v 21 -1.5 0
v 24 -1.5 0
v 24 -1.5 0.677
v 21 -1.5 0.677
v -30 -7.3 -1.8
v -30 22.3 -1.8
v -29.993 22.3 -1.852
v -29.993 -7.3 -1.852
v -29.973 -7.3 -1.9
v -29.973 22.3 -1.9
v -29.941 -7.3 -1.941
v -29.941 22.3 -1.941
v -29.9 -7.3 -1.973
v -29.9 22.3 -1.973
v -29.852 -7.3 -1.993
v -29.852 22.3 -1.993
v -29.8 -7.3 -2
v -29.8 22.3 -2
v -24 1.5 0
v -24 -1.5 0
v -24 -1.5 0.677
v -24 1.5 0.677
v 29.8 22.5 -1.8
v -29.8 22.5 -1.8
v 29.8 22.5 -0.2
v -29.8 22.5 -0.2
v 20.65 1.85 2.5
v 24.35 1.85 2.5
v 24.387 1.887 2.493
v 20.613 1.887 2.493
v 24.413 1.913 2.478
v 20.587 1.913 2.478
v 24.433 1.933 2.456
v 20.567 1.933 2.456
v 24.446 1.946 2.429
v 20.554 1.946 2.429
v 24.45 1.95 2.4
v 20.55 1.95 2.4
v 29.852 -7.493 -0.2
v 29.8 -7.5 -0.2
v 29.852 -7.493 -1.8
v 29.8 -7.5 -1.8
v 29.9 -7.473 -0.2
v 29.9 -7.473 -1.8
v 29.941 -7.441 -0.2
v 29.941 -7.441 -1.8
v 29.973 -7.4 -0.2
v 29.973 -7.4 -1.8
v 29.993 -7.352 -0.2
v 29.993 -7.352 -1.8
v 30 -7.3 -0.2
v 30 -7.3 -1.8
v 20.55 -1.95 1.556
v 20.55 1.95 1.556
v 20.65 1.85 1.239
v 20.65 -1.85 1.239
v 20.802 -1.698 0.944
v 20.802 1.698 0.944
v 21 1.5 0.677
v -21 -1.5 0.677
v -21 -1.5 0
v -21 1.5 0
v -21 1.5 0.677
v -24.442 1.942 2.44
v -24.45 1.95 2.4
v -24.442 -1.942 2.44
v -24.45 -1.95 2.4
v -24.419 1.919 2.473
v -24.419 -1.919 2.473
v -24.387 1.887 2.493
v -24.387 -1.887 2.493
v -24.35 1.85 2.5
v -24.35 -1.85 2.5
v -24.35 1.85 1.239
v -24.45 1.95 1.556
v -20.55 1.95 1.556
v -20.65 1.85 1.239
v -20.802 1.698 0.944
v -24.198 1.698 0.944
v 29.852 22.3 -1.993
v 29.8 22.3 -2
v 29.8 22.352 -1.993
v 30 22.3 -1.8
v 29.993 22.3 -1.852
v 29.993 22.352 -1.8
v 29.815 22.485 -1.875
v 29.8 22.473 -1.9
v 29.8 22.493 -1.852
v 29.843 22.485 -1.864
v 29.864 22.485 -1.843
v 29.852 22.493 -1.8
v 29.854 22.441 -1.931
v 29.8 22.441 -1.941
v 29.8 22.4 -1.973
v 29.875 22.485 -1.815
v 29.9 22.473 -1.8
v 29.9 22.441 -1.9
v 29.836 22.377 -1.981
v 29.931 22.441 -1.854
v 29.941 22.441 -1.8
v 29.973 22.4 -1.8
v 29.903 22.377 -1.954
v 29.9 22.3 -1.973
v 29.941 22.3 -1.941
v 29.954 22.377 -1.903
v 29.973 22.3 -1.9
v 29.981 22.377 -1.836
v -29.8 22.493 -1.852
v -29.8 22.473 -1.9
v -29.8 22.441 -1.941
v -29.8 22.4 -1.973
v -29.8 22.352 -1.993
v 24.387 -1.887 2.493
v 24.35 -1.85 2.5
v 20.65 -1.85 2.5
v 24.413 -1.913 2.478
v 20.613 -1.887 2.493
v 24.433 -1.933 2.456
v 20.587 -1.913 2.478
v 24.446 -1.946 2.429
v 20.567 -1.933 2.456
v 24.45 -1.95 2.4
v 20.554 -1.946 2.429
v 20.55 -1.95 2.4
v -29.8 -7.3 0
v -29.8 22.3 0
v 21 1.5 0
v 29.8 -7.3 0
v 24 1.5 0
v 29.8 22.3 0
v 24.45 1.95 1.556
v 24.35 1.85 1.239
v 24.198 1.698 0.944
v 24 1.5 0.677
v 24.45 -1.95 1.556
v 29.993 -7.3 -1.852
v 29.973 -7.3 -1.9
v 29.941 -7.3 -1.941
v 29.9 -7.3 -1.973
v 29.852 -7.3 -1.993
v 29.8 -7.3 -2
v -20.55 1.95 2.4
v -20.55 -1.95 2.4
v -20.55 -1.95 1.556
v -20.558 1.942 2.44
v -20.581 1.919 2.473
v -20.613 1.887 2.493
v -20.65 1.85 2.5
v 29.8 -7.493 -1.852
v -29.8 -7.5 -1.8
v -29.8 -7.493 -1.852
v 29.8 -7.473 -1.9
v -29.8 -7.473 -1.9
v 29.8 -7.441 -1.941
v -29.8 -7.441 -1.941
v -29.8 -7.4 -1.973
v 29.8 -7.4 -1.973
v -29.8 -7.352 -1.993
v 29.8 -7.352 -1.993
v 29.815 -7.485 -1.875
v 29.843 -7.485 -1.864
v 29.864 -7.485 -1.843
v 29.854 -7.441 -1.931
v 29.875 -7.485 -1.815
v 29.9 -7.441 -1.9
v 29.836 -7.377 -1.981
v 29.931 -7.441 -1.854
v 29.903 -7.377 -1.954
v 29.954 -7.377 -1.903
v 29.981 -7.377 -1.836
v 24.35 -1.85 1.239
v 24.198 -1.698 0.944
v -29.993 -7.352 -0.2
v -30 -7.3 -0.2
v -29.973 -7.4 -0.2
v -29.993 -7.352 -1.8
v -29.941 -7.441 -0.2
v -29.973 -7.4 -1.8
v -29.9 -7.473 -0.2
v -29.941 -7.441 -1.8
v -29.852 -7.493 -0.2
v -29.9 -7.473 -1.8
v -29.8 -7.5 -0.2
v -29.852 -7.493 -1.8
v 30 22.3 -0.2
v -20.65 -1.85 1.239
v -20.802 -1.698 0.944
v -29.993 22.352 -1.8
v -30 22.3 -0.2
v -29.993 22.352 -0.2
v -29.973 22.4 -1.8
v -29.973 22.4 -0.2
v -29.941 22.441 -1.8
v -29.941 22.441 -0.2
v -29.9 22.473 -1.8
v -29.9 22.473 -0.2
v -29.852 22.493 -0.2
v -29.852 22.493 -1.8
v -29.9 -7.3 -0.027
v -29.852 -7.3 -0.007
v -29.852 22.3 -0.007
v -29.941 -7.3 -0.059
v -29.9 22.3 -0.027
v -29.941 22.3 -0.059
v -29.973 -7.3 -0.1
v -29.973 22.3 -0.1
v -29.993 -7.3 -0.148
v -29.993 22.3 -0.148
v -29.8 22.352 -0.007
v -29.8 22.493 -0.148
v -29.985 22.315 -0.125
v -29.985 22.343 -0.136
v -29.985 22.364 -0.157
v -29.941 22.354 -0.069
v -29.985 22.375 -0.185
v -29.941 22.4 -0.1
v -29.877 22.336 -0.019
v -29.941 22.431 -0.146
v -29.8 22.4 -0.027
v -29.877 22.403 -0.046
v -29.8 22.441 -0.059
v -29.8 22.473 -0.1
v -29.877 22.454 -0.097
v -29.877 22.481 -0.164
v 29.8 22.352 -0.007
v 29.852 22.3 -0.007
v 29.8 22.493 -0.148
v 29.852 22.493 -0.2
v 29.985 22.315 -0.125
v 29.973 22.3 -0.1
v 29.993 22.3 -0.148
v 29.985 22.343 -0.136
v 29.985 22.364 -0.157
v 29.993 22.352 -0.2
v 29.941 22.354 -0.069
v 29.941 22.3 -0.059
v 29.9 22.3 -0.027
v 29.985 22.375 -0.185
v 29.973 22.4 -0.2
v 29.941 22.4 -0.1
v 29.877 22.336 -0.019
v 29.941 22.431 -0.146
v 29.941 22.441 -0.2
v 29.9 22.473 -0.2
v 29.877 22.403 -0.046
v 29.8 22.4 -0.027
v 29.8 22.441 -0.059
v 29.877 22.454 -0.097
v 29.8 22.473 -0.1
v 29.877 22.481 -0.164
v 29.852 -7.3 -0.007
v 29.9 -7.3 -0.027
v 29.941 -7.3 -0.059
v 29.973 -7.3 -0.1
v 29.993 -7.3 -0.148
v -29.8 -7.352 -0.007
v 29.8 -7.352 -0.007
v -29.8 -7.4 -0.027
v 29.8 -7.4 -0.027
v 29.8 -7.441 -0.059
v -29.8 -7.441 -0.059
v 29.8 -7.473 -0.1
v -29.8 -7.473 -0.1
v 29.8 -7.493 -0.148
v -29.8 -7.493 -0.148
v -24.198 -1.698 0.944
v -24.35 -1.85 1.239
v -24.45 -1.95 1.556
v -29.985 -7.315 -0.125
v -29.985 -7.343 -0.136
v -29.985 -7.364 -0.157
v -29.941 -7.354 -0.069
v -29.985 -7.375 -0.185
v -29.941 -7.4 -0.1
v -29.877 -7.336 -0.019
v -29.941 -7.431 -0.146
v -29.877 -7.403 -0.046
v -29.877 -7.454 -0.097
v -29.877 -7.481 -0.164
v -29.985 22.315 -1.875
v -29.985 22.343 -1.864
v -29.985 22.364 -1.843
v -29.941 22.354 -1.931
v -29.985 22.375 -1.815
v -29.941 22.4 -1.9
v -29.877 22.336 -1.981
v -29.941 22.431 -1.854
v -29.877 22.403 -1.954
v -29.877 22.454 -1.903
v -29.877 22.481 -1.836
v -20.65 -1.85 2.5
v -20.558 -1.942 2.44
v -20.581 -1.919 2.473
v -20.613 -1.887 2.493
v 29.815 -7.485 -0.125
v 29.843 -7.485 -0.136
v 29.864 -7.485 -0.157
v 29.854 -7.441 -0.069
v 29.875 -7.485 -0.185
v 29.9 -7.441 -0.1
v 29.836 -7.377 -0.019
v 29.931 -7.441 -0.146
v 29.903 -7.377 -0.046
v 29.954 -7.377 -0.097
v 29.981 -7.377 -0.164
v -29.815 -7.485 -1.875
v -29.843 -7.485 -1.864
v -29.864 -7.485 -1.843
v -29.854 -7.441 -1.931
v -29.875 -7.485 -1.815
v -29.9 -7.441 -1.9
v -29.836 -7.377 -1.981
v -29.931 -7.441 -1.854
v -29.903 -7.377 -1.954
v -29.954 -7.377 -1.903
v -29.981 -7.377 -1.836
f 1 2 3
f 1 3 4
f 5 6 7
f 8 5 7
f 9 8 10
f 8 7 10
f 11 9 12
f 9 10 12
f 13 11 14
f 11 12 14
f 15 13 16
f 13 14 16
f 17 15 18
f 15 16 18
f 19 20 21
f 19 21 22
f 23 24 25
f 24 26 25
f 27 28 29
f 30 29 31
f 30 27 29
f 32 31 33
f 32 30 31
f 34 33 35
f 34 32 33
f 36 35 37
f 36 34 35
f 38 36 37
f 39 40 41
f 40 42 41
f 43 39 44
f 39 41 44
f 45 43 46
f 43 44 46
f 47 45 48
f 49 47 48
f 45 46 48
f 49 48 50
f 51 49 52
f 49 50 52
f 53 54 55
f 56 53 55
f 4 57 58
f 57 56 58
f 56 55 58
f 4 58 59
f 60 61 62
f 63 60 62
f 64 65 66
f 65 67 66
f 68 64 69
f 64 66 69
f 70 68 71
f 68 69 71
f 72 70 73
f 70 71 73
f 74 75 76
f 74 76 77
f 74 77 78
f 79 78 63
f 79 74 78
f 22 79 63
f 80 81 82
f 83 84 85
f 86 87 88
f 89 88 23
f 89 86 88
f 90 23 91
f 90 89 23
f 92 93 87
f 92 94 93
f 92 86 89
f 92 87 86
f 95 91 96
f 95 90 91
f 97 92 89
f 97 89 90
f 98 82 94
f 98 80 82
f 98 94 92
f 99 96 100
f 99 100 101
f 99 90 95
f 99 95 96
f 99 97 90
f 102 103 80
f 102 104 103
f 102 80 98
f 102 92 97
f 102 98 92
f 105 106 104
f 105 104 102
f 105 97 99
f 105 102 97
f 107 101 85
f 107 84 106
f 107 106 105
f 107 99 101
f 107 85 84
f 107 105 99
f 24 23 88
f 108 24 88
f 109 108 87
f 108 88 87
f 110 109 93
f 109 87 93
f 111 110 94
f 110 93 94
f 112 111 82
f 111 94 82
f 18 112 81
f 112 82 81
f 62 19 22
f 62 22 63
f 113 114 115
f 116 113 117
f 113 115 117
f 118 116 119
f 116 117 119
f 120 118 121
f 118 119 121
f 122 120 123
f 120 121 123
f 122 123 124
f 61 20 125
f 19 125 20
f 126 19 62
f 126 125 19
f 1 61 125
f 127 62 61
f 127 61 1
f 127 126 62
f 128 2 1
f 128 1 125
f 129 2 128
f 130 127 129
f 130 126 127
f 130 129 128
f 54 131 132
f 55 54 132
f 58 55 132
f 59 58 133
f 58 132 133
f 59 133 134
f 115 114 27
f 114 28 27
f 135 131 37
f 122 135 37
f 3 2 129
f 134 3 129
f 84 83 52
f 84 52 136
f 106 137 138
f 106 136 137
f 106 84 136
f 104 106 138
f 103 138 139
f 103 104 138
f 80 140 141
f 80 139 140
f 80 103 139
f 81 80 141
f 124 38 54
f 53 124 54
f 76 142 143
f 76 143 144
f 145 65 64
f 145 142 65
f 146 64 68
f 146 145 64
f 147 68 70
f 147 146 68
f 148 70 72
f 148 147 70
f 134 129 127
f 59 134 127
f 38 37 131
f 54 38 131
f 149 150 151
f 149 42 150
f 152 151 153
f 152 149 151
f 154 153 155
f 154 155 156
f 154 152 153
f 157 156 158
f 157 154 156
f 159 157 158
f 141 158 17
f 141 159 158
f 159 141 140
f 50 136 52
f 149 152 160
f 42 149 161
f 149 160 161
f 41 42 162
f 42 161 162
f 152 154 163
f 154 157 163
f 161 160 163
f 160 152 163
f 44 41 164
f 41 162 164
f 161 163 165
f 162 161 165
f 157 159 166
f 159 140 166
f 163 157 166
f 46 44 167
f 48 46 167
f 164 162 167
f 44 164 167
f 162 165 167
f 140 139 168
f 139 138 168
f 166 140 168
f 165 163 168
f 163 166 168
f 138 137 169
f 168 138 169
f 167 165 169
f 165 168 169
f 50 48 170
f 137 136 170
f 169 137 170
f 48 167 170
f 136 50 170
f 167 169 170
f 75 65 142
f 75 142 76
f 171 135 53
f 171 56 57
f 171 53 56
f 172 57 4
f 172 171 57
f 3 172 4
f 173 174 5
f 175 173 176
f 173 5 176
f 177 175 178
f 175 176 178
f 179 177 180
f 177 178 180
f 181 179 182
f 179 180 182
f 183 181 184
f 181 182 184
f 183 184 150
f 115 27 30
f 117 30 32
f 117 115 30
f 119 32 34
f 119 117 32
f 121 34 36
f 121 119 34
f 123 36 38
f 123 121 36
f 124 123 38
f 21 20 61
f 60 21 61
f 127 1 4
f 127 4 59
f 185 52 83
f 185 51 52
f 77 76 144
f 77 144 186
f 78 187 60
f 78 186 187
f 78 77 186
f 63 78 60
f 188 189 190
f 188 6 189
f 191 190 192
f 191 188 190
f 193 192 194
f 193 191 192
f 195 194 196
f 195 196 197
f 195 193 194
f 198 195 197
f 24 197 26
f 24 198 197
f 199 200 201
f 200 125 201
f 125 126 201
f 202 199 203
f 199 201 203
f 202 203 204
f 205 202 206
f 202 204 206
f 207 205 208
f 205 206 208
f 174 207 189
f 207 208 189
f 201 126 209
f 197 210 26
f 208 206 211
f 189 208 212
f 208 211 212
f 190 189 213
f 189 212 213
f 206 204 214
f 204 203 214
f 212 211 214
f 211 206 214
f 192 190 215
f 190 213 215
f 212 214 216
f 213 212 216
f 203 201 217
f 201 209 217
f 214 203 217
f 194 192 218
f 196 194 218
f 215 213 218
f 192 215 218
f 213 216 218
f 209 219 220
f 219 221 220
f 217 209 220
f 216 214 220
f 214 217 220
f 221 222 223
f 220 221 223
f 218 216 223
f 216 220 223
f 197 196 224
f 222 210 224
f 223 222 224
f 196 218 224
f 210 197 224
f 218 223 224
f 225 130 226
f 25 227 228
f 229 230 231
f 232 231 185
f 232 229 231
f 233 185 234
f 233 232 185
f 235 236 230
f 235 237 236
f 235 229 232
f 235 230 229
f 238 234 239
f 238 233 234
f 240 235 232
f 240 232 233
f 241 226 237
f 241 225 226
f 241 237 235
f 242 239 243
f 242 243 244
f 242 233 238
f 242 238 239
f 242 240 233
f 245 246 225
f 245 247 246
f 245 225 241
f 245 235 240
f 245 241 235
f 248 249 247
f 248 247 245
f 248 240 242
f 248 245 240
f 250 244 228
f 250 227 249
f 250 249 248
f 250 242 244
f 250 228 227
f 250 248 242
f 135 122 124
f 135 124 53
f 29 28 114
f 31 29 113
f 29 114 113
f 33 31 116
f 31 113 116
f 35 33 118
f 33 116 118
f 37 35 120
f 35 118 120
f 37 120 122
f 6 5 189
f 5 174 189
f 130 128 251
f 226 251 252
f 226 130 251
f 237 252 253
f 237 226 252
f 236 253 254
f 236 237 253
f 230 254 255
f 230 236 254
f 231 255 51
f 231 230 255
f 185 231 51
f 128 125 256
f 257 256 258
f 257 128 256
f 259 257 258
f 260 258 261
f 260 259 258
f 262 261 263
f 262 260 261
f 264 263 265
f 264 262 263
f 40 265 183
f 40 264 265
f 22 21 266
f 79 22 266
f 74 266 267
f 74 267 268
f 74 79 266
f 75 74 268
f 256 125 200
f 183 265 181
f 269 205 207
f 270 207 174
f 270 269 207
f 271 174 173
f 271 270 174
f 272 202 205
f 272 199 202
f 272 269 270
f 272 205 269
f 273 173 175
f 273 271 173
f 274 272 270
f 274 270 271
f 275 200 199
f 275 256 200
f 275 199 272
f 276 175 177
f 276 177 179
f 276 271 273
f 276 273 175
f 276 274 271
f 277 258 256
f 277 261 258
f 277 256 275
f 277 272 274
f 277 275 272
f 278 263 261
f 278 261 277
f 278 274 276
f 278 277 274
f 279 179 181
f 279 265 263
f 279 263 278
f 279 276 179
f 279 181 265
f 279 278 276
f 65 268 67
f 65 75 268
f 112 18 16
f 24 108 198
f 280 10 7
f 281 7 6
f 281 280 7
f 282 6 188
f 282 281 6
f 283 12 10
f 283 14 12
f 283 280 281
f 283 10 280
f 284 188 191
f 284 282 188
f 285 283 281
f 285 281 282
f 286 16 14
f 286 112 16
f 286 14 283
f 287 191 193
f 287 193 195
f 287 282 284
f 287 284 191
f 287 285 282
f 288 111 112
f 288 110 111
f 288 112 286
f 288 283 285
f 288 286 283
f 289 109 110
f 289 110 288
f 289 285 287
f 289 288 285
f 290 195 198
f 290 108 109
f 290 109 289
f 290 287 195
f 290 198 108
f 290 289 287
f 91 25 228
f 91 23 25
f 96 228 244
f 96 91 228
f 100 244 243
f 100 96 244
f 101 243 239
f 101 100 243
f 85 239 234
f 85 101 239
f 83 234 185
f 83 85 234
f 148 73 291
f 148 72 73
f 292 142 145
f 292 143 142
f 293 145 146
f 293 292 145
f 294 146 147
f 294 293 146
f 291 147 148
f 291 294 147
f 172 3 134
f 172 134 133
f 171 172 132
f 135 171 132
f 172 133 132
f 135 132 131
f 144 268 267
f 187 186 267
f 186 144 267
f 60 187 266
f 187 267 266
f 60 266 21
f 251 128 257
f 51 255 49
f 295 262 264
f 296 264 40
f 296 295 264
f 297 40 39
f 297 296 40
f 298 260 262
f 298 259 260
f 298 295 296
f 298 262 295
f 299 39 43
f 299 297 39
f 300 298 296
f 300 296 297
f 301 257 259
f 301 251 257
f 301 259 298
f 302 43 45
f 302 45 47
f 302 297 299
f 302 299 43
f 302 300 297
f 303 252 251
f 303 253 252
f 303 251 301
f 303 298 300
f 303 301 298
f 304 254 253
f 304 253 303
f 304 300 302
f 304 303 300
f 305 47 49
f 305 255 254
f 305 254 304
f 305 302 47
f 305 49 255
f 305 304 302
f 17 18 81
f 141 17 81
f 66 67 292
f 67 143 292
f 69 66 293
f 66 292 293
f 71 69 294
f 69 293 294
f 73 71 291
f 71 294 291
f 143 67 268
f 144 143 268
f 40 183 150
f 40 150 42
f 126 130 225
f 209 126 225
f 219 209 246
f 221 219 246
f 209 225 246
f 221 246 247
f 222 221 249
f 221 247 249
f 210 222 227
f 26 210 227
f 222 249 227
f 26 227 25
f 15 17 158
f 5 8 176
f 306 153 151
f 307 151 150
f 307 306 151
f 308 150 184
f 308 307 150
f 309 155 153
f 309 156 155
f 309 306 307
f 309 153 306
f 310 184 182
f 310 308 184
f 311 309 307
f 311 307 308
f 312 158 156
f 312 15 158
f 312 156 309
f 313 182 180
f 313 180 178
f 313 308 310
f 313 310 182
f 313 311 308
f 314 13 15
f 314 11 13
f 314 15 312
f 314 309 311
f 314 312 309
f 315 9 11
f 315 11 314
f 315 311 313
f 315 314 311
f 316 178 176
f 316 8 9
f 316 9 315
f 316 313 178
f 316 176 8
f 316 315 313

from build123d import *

# Parameters (mm, degrees)
SKETCH_1_W          = 60
SKETCH_1_H          = 30
EXTRUDE_1_DEPTH     = 2
SKETCH_2_W          = 3
SKETCH_2_H          = 3
EXTRUDE_2_DEPTH     = 1
EXTRUDE_START       = -4
EXTRUDE_3_DEPTH     = 5
CUT_EXTRUDE_1_REACH = 60.969
FILLET_1_R          = 0.1
FILLET_2_R          = 0.2


with BuildPart() as part:
    # 草图1 → 凸台-拉伸1 (new body)
    with BuildSketch(Plane.XY):
        with Locations((0, 7.5)):
            Rectangle(SKETCH_1_W, SKETCH_1_H)
    extrude(amount=-EXTRUDE_1_DEPTH)

    # 草图2 → 凸台-拉伸2 (add)
    with BuildSketch(Plane.XY):
        with Locations((-22.5, 0)):
            Rectangle(SKETCH_2_W, SKETCH_2_H)
    extrude_2 = extrude(amount=EXTRUDE_2_DEPTH)

    # 草图3 → 凸台-拉伸3 (add)
    with BuildSketch(Plane.XZ.offset(1.5).offset(EXTRUDE_START)):
        with BuildLine():
            Line((-24.45, 2.5), (-20.55, 2.5))
            Line((-20.55, 2.5), (-20.55, 1.555590279))
            ThreePointArc((-20.55, 1.555590279), (-20.719957697, 1.088161527), (-21, 0.677124344))
            Line((-21, 0.677124344), (-24, 0.677124344))
            ThreePointArc((-24, 0.677124344), (-24.280042303, 1.088161527), (-24.45, 1.555590279))
            Line((-24.45, 1.555590279), (-24.45, 2.5))
        make_face()
    extrude_3 = extrude(amount=EXTRUDE_3_DEPTH)

    # 草图4 → 切除-拉伸1 (cut, up to next)
    with BuildSketch(Plane.ZY.offset(24.45), mode=Mode.PRIVATE) as cut_extrude_1_sk1:
        with BuildLine():
            Line((2.5, 1.95), (1.555590279, 1.95))
            ThreePointArc((1.555590279, 1.95), (1.088161527, 1.780042303), (0.677124344, 1.5))
            Line((0.677124344, 1.5), (0.677124344, 2.5))
            Line((0.677124344, 2.5), (2.5, 2.5))
            Line((2.5, 2.5), (2.5, 1.95))
        make_face()
    cut_extrude_1_tool1 = extrude(cut_extrude_1_sk1.sketch, amount=-CUT_EXTRUDE_1_REACH, mode=Mode.PRIVATE) & part.part
    # 草图4 → 切除-拉伸1 (cut, up to next)
    with BuildSketch(Plane.ZY.offset(24.45), mode=Mode.PRIVATE) as cut_extrude_1_sk2:
        with BuildLine():
            Line((0.677124344, -2.5), (2.5, -2.5))
            Line((2.5, -2.5), (2.5, -1.95))
            Line((2.5, -1.95), (1.555590279, -1.95))
            ThreePointArc((1.555590279, -1.95), (1.088161527, -1.780042303), (0.677124344, -1.5))
            Line((0.677124344, -1.5), (0.677124344, -2.5))
        make_face()
    cut_extrude_1_tool2 = extrude(cut_extrude_1_sk2.sketch, amount=-CUT_EXTRUDE_1_REACH, mode=Mode.PRIVATE) & part.part
    cut_extrude_1_1 = cut_extrude_1_tool1.solids().sort_by_distance((-24.45, 2.169375, 1.500125))[0]
    add(cut_extrude_1_1, mode=Mode.SUBTRACT)
    cut_extrude_1_2 = cut_extrude_1_tool2.solids().sort_by_distance((-24.45, -2.169375, 1.500125))[0]
    add(cut_extrude_1_2, mode=Mode.SUBTRACT)
    cut_extrude_1 = cut_extrude_1_1 + cut_extrude_1_2  # 切除-拉伸1 as one shape, for the pattern or mirror that repeats it

    # 镜向1: 凸台-拉伸2, 凸台-拉伸3, 切除-拉伸1 across plane
    add(extrude_2.mirror(Plane(origin=(0, 0, 0), x_dir=(0, 0, 1), z_dir=(1, 0, 0))))
    add(extrude_3.mirror(Plane(origin=(0, 0, 0), x_dir=(0, 0, 1), z_dir=(1, 0, 0))))
    add(cut_extrude_1.mirror(Plane(origin=(0, 0, 0), x_dir=(0, 0, 1), z_dir=(1, 0, 0))), mode=Mode.SUBTRACT)

    # 圆角1
    fillet_1_edges = [part.edges().sort_by_distance(p)[0] for p in [
        (22.5, -1.95, 2.5),
        (24.45, 0, 2.5),
        (20.55, 0, 2.5),
        (22.5, 1.95, 2.5),
        (-22.5, -1.95, 2.5),
        (-20.55, 0, 2.5),
        (-24.45, 0, 2.5),
        (-22.5, 1.95, 2.5),
    ]]
    fillet(fillet_1_edges, radius=FILLET_1_R)

    # 圆角2
    fillet_2_edges = [part.edges().sort_by_distance(p)[0] for p in [
        (30, 7.5, -2),
        (0, 22.5, -2),
        (-30, 7.5, -2),
        (0, 22.5, 0),
        (30, 7.5, 0),
        (0, -7.5, 0),
        (-30, 7.5, 0),
        (0, -7.5, -2),
        (-30, 22.5, -1),
        (30, 22.5, -1),
        (30, -7.5, -1),
        (-30, -7.5, -1),
    ]]
    fillet(fillet_2_edges, radius=FILLET_2_R)


solid = part.part
